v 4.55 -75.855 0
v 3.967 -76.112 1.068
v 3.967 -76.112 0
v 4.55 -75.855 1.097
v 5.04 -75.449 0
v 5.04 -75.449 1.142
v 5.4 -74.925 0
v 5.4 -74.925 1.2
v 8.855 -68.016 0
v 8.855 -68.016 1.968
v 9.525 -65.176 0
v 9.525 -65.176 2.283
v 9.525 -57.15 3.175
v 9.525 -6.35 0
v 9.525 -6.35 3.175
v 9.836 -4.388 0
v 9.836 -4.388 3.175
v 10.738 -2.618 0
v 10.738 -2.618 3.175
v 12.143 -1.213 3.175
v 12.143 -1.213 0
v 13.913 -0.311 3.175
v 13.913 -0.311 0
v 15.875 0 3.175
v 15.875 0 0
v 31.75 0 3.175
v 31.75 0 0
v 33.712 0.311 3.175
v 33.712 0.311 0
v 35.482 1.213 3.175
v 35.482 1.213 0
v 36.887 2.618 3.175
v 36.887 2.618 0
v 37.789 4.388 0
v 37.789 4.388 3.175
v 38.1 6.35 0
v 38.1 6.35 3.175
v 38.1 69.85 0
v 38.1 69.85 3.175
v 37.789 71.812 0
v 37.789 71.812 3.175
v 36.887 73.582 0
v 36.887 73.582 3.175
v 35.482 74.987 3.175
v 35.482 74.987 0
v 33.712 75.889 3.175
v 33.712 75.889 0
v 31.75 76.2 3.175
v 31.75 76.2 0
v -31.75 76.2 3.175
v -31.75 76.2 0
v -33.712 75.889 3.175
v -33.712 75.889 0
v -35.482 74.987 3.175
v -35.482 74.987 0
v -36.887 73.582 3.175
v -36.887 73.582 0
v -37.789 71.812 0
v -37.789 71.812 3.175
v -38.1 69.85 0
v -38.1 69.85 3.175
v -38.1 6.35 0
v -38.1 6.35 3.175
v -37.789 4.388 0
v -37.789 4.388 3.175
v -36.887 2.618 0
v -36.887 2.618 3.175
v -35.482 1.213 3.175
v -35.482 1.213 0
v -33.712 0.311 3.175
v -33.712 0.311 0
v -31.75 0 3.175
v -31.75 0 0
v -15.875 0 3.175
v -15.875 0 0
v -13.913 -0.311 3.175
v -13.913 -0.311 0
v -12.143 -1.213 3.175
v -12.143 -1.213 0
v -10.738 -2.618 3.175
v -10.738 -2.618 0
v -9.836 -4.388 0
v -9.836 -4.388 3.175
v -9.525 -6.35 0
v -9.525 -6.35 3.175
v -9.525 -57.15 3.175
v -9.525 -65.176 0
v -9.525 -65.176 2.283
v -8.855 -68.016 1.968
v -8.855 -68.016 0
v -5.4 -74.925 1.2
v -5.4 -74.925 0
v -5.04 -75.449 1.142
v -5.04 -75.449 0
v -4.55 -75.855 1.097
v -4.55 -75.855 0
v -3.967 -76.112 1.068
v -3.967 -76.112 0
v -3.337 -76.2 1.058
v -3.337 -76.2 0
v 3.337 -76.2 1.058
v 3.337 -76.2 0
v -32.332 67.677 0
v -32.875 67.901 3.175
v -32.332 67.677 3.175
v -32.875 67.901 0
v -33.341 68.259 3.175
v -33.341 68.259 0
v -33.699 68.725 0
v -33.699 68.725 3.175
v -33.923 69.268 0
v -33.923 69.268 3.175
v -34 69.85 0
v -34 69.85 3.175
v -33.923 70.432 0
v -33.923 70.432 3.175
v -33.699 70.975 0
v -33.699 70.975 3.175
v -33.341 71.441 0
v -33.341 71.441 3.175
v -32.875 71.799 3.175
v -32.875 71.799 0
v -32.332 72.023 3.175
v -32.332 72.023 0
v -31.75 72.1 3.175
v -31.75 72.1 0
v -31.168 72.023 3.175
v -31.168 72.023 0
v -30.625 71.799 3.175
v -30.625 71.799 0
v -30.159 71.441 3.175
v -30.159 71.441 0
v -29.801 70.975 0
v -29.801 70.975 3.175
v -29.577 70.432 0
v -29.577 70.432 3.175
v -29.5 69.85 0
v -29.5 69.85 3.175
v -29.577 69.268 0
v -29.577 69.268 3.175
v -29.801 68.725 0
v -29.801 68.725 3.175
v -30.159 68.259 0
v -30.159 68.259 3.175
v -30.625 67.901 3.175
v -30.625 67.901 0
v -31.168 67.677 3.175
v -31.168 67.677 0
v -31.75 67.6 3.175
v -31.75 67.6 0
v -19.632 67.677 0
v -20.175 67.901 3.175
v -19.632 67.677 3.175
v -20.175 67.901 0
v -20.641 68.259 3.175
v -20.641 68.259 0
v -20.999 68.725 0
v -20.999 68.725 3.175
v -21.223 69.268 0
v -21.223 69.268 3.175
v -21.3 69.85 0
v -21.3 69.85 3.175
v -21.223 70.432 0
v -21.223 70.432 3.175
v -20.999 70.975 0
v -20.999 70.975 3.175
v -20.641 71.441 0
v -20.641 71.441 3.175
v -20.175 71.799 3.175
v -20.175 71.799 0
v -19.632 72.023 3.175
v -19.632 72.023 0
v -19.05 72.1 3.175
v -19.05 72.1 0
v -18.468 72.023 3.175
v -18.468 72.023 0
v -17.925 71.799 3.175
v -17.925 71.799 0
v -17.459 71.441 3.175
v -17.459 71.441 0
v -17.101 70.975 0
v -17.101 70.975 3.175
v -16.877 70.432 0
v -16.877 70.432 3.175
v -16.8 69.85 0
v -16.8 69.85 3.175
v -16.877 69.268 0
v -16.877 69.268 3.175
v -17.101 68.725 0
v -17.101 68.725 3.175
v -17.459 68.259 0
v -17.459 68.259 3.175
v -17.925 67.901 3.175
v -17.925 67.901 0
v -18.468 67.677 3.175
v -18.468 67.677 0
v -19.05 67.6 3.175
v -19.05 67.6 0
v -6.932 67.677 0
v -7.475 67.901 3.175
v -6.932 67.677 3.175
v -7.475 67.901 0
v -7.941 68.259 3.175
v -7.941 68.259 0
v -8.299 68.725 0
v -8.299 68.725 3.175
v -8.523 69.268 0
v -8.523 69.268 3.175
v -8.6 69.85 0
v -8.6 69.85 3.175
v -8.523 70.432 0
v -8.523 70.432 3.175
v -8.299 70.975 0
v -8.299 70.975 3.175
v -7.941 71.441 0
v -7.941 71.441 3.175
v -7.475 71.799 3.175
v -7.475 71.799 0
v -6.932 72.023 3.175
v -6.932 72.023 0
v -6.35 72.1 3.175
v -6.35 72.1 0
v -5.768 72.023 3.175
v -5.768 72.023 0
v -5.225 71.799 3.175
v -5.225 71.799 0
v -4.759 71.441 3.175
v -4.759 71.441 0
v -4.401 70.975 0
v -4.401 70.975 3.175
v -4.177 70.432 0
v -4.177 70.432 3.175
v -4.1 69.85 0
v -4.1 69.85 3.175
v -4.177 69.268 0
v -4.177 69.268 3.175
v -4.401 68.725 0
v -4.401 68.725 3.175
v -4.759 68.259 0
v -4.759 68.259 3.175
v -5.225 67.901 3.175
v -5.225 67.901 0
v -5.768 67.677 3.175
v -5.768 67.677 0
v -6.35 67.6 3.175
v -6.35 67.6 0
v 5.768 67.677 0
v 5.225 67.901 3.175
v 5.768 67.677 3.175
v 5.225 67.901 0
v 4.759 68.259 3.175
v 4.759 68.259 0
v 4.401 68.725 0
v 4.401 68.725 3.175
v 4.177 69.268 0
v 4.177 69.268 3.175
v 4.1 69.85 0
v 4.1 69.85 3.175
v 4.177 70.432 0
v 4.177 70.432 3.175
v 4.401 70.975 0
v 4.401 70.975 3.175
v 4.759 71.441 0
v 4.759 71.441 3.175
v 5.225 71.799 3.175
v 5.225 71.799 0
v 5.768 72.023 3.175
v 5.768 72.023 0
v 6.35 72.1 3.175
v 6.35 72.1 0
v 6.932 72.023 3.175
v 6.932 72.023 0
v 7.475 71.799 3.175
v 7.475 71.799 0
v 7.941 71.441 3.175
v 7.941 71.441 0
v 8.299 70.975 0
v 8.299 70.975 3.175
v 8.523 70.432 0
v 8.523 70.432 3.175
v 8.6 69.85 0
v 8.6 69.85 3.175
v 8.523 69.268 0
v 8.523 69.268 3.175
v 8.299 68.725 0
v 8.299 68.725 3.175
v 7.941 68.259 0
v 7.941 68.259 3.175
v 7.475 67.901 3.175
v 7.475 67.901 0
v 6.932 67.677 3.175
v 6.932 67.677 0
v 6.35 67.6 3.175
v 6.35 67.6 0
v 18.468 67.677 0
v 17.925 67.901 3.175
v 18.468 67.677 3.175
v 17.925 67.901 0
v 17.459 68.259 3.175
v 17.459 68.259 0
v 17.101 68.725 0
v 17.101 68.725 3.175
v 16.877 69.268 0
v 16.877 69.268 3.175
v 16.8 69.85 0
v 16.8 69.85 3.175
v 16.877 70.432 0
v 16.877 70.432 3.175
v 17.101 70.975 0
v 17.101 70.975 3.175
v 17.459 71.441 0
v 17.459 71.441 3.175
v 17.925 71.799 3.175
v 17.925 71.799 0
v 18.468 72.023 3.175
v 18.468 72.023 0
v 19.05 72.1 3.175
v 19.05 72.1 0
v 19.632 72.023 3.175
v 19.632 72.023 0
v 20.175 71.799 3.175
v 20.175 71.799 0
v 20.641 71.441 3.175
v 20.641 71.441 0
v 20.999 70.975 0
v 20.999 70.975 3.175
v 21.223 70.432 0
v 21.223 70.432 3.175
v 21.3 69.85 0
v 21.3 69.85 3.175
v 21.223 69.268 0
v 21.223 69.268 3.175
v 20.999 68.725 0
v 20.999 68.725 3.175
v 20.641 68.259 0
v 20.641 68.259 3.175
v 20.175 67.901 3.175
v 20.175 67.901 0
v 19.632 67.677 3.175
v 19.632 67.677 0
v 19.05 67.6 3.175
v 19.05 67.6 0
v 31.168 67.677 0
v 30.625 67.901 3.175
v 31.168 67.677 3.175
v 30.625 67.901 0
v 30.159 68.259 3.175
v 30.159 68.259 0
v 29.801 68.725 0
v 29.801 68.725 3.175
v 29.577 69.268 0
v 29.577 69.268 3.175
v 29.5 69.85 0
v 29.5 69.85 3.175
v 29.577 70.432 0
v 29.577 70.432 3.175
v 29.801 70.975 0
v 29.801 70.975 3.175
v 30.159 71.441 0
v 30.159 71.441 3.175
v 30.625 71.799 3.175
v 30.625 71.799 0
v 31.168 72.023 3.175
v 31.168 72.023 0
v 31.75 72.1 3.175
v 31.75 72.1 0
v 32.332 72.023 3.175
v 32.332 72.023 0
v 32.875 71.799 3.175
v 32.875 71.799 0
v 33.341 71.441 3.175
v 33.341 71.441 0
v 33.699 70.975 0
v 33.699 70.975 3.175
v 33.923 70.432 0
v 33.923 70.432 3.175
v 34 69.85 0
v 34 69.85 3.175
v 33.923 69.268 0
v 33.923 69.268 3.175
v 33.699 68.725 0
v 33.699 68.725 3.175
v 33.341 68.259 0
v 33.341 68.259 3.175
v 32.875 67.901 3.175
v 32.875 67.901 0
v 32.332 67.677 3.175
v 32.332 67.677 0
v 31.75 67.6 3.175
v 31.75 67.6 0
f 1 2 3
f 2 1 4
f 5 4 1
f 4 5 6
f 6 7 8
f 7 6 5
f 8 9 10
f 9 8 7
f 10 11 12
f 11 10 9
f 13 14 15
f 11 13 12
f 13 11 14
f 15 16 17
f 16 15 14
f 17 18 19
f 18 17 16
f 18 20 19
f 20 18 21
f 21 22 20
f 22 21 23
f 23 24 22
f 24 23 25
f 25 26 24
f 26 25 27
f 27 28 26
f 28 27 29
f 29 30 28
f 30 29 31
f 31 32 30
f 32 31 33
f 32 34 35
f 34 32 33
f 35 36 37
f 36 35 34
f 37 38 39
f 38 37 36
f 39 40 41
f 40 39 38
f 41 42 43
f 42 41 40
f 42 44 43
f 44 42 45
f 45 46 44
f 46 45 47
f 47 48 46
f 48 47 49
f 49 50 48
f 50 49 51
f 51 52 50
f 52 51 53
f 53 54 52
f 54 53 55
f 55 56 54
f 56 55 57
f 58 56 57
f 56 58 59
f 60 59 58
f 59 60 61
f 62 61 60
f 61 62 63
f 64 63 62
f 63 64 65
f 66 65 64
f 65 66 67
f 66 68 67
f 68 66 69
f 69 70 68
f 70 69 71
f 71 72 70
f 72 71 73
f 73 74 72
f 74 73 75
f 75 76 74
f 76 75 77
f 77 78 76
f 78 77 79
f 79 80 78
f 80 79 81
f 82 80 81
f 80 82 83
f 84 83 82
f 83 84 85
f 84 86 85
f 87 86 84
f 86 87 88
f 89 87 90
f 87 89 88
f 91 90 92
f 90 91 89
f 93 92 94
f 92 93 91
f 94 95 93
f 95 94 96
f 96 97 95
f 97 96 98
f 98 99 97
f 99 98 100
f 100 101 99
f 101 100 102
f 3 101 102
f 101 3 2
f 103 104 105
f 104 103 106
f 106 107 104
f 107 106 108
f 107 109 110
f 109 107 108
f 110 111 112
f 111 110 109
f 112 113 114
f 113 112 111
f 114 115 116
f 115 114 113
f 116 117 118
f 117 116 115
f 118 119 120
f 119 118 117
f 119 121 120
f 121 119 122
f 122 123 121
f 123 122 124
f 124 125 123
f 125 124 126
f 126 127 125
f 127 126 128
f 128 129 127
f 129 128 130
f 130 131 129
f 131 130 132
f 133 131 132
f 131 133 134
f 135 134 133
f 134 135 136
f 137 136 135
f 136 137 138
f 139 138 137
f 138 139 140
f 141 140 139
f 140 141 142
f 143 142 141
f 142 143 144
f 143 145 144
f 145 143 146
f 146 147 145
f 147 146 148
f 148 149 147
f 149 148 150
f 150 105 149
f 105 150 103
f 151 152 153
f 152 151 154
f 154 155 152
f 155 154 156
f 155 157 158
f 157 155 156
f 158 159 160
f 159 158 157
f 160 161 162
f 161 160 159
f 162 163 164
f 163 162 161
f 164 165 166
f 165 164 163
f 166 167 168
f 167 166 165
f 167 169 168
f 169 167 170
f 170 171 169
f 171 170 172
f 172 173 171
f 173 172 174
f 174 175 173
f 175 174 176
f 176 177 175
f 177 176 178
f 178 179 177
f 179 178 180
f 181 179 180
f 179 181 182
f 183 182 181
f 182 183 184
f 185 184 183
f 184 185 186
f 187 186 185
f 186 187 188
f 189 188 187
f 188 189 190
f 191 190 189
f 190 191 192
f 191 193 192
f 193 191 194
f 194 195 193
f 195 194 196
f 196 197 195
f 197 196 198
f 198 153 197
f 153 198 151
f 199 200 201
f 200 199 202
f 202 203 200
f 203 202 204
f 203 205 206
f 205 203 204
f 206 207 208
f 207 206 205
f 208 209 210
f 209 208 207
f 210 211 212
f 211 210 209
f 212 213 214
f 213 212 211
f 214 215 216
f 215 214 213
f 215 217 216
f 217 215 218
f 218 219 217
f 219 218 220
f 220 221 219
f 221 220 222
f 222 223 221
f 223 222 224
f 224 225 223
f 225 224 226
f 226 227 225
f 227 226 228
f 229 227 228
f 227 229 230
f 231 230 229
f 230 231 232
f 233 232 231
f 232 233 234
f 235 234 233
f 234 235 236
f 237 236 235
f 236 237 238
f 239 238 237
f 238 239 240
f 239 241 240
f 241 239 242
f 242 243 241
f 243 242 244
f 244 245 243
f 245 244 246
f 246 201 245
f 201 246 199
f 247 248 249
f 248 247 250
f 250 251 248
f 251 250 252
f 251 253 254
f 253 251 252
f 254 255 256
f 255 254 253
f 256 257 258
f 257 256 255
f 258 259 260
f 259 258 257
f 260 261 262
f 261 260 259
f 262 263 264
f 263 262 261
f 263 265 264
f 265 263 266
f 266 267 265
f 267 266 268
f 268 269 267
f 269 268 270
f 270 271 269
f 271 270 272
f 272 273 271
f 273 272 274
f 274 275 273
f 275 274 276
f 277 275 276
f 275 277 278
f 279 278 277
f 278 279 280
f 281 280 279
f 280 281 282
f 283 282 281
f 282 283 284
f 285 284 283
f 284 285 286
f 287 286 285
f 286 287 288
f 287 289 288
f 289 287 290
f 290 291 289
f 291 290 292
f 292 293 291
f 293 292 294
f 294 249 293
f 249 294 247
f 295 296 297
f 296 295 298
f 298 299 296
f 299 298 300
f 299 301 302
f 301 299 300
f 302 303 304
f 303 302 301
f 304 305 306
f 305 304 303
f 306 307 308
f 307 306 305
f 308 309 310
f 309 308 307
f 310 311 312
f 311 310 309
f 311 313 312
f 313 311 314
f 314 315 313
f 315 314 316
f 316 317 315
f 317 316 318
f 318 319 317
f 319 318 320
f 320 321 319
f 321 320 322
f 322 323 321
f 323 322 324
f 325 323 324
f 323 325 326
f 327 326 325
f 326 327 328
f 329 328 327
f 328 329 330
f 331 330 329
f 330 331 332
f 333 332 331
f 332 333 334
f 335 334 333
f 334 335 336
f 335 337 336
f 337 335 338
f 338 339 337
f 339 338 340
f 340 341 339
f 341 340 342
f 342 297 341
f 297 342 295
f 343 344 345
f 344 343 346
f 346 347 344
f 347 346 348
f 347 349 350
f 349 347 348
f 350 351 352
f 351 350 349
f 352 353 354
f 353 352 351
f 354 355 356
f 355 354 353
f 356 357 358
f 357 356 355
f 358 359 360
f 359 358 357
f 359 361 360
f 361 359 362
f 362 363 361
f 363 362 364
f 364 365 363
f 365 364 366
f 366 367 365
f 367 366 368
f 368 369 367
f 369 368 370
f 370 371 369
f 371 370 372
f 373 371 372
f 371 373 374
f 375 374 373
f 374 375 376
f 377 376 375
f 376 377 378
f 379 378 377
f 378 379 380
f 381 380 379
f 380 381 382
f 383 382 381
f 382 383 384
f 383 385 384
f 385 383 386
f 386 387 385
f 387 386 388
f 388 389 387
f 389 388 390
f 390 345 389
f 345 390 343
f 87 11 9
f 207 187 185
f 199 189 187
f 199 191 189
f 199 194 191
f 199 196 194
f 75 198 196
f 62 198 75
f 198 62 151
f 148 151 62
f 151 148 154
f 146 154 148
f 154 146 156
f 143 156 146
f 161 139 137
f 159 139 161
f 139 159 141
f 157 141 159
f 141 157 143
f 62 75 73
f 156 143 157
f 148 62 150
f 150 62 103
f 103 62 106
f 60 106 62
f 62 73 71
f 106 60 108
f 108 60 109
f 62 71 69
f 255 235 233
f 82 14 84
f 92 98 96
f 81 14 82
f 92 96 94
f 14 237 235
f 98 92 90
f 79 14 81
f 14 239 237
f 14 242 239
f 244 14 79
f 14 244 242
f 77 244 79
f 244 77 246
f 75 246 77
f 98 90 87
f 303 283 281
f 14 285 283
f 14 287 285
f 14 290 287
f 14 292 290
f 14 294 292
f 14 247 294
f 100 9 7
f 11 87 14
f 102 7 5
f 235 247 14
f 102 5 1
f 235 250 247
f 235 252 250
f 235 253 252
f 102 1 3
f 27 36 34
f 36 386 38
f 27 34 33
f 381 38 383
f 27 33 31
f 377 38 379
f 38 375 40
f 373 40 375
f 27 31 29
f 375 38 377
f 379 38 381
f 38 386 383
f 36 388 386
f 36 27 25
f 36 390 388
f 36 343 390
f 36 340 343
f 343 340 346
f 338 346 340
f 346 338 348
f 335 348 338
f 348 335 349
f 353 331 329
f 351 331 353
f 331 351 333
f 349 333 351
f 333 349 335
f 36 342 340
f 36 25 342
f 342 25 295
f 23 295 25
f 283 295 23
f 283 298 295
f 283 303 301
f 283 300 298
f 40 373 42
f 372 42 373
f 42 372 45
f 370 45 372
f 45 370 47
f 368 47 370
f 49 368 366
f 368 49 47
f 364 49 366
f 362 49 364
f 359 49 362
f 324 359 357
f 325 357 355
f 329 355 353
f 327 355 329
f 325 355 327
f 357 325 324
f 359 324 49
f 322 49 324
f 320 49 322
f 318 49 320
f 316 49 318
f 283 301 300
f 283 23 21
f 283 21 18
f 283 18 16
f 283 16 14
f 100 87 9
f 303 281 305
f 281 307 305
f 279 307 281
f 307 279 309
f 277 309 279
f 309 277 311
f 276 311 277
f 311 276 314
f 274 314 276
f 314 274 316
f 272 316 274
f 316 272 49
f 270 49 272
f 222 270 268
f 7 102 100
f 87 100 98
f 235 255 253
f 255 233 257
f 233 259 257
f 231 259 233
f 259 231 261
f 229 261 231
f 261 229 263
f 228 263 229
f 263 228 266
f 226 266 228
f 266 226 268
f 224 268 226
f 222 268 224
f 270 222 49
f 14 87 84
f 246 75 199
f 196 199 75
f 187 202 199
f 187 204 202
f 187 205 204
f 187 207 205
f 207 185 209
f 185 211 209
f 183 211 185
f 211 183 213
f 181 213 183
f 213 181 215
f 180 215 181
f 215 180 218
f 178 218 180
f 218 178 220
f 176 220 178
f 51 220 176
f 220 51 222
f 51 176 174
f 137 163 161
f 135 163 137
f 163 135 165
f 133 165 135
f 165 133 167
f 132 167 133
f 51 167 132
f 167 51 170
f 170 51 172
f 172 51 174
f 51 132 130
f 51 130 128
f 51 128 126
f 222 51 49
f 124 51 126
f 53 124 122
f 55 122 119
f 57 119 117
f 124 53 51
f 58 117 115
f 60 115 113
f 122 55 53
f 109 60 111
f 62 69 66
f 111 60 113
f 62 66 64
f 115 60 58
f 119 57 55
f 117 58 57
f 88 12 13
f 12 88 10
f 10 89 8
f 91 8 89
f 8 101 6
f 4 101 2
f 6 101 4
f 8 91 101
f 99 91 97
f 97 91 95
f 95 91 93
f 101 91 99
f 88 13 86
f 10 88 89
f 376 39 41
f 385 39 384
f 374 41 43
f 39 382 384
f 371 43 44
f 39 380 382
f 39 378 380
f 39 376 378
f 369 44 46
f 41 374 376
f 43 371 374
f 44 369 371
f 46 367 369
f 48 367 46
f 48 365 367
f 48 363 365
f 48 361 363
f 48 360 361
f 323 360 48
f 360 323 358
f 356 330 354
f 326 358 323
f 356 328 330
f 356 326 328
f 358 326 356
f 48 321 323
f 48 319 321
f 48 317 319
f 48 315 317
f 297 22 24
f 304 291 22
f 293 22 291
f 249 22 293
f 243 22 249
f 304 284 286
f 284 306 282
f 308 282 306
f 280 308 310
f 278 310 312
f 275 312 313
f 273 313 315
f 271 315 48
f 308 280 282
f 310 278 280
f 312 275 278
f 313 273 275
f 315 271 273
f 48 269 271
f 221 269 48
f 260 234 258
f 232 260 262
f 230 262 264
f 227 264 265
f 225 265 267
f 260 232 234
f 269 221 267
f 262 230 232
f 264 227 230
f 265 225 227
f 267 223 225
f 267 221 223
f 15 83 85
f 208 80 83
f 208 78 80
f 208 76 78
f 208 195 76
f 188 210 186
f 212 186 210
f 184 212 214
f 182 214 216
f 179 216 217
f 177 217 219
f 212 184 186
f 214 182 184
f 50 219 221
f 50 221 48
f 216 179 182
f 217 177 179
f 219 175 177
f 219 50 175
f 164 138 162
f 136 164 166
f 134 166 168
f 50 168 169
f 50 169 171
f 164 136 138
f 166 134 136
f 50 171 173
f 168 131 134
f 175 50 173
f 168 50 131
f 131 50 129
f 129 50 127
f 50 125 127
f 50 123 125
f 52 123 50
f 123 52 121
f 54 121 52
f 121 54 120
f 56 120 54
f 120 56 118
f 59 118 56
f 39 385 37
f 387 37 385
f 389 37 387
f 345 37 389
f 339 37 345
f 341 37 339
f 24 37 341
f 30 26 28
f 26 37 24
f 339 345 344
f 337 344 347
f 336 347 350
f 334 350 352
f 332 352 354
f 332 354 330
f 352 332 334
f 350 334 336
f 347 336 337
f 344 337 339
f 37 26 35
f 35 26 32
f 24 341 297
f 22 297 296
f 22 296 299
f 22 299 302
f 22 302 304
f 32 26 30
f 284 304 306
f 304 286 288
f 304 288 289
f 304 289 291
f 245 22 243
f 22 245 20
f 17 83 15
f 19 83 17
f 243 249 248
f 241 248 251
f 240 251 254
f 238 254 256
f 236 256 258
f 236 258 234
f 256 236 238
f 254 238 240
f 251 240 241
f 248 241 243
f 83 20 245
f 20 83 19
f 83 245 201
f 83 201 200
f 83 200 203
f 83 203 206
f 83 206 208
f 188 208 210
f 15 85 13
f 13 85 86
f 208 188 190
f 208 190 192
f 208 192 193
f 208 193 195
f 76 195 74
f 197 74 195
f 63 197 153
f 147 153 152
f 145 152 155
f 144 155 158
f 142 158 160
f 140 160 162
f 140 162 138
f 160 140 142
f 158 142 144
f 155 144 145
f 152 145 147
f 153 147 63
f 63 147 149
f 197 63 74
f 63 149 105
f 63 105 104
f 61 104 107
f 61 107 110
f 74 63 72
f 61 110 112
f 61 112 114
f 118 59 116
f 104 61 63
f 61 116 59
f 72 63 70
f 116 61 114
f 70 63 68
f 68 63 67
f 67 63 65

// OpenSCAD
// file: ../lib/TOGUnitTable-v1.scad
// TOGUnitTable-v1.1.0 - Library for handling 'complex amounts' in the form of [multiplier, unit name], e.g. [1.5, "inch"]
//
// 2023-07-01: the following 'annotation' is something I just made up,
// but is intended as a way for future packaging tools to know that it's 'safe'
// (because everything has been somewhat namespaced) to turn a `use <x>`
// into an `include <x>`, making it inlinable:
// safe-to-include: true
// 
// Versions:
// v1.0.0:
// - Created it.
// v1.1.0:
// - Add optional 'dbgctxstr' parameter to unit decoding functions, for better error messages
// 
// Naming convention:
// Doing 'OO without classes', here.
// Fully qualified name = class or package name + "__" + member name
// Class or package name may itself be namespaced, and class names may double as package names.
// Here, tog_unittable names both a class and a package.

// Demo unit table uses 'micrometer' as the base unit
// in order to keep multipliers as integers as much as possible.
tog_unittable__demo_unit_table = [
	["um",    [    1   ,   "um"], "micrometer" ],
	["mm",    [ 1000   ,   "um"], "millimeter" ],
	["inch",  [25400   ,   "um"], "inch"       ],
	["u",     [    1/16, "inch"], "model unit" ], // As used by TGx9 et al
	["atom",  [    8   ,    "u"], "model atom" ],
	["chunk", [    3   , "atom"], "model chunk"],
];

use <./DbgCtxStrLib1.scad>

function tog_unittable__list__filter(list, predicate) = [
	for( item=list ) if( predicate(item) ) item
];
function tog_unittable__list__first(list, on_error) =
	len(list) > 0 ? list[0] : on_error();

function tog_unittable__unit_value_ca(unit_table, unit_name, dbgctxstr=undef) =
	tog_unittable__list__first(
		tog_unittable__list__filter(unit_table, function (entry) entry[0] == unit_name),
		function () assert(false,
			str("Did not find entry for unit '", unit_name, "' in unit table", dbgctxstr_errmsg_suffix(dbgctxstr))
		)
	)[1];

function tog_unittable__ca__is_valid( ca ) =
	is_list(ca) && len(ca) == 2;

// Break down 'amount' until it is in a base unit (one which is defined in terms of itself)
function tog_unittable__simplify_ca(unit_table, amount, dbgctxstr=undef) =
	assert( tog_unittable__ca__is_valid(amount), str(amount, " is not a valid Complex Amount (should be [numeric_value, \"unit_name\"])", dbgctxstr=dbgctxstr) )
	let( unit_value_ca = tog_unittable__unit_value_ca(unit_table, amount[1], dbgctxstr=dbgctxstr) )
	unit_value_ca[1] == amount[1] ? amount :
		tog_unittable__simplify_ca(unit_table, [amount[0] * unit_value_ca[0], unit_value_ca[1]]);

function tog_unittable__divide_ca(unit_table, numerator, denominator, dbgctxstr=undef) =
	let(
		numerator_base_ca   = tog_unittable__simplify_ca(unit_table, numerator, dbgctxstr=dbgctxstr),
		denominator_base_ca = tog_unittable__simplify_ca(unit_table, denominator, dbgctxstr=dbgctxstr)
	)
	assert(numerator_base_ca[1] == denominator_base_ca[1], str("Different base units found for ", numerator[1], " and ", denominator[1]))
	numerator_base_ca[0] / denominator_base_ca[0];	

assert(tog_unittable__divide_ca(tog_unittable__demo_unit_table, [1,   "mm"], [  1, "mm"]) ==     1   );
assert(tog_unittable__divide_ca(tog_unittable__demo_unit_table, [1,   "mm"], [  1, "um"]) ==  1000   );
assert(tog_unittable__divide_ca(tog_unittable__demo_unit_table, [1, "inch"], [  1, "um"]) == 25400   );
assert(tog_unittable__divide_ca(tog_unittable__demo_unit_table, [1, "inch"], [  1, "mm"]) ==    25.4 );
assert(tog_unittable__divide_ca(tog_unittable__demo_unit_table, [1, "inch"], [254, "um"]) ==   100   );
assert(tog_unittable__divide_ca(tog_unittable__demo_unit_table, [1,    "u"], [  1, "um"]) ==  1587.5 );
// file: ../lib/TOGStringLib1.scad
// TOGStringLib1.7
// 
// Functions for parsing quantities
// and other misc. string handling.
// 
// v1.5
// - togstr1_parse_quantity will treat unit-only strings as meaning 1/1 of that unit.
//   e.g. togstr1_parse_quantity("foot") = [[[1,1], "foot", 4]]
// v1.6:
// - togstr1_parse_quantity allows unit name to be omitted when quantity is zero and $togunits1_default_unit is defined
// v1.7:
// - Add optional 'dbgctxstr' parameter to unit decoding functions, for better error messages
// 
// Globals: $togunits1_default_unit - affects what 'unit' is returned
// when interpreting numbers or strings that lack the unit.


function togstr1__todo(message) = assert(false, str("TODO: ", message));

module togstr1__assert_eq(a, b) {
	if( a != b ) {
		assert( a == b, str(a, " != ", b) );
	}
}



function togstr1_slice(source, i0, i1) =
	i0 == i1 ? "" :
	str(source[i0], togstr1_slice(source, i0+1, i1));

function togstr1_tokenize(source, sep, maxcount=9999, i=0, tokenstart=0) =
	len(source) == i ? (
		(tokenstart < i) ? [togstr1_slice(source, tokenstart, i)] : []
	) :
	source[i] == sep ? (
		(tokenstart < i) ? concat([togstr1_slice(source, tokenstart, i)], togstr1_tokenize(source, sep, maxcount-1, i+1, i+1)) :
		togstr1_tokenize(source, sep, maxcount, i+1, i+1)
	) :
	maxcount <= 1 ? [togstr1_slice(source, tokenstart, len(source))] :
	togstr1_tokenize(source, sep, maxcount, i+1, tokenstart);

togstr1__assert_eq( ["foo","bar","baz"], togstr1_tokenize("foo-bar-baz", "-") );
// Duplicate delimiters are ignored
togstr1__assert_eq( ["foo","bar","baz"], togstr1_tokenize("foo--bar--baz", "-") );
// Trailing delimiters are ignored
togstr1__assert_eq( ["foo","bar","baz"], togstr1_tokenize("foo--bar--baz--", "-") );
// Leading delimiters are ignored
togstr1__assert_eq( ["foo","bar","baz"], togstr1_tokenize("--foo--bar--baz", "-") );
// Can limit number of tokens returned
togstr1__assert_eq( ["foo","bar-baz"], togstr1_tokenize("foo-bar-baz", "-", 2) );
togstr1__assert_eq( ["foo","bar-baz"], togstr1_tokenize("--foo--bar-baz", "-", 2) );
togstr1__assert_eq( ["foo","bar--baz"], togstr1_tokenize("--foo--bar--baz", "-", 2) );
togstr1__assert_eq( ["foo"], togstr1_tokenize("--foo--", "-", 2) );




/** \d+ -> [num, end_index] */
function togstr1_parse_decimal_nat(str, index=0, current=0, dbgctxstr=undef) =
	len(str) == index ? [current, index] :
	let( dig = ord(str[index]) - ord("0") )
	(dig >= 0 && dig <= 9) ? togstr1_parse_decimal_nat(str, index+1, current*10 + dig, dbgctxstr=dbgctxstr) :
	[current, index];

togstr1__assert_eq( [123,3], togstr1_parse_decimal_nat("123") );
togstr1__assert_eq( [123,3], togstr1_parse_decimal_nat("123.45") );

/** [+-]*\d+ ->  [[num, den], end_index] */
function togstr1_parse_decimal_number(str, index=0, dbgctxstr=undef) =
	str[index] == "+" ? togstr1_parse_decimal_number(str, index+1) :
	str[index] == "-" ? let(r=togstr1_parse_decimal_number(str, index+1)) [[-r[0][0], r[0][1]], r[1]] :
	let(r = togstr1_parse_decimal_nat(str, index, dbgctxstr=dbgctxstr))
	str[r[1]] != "." ? [[r[0], 1], r[1]] :
	let(fracr = togstr1_parse_decimal_nat(str, r[1]+1))
	let(mult = pow(10, fracr[1]-(r[1]+1)))
	[[r[0]*mult + fracr[0], mult], fracr[1]];

togstr1__assert_eq( [[   36,   1], 2], togstr1_parse_decimal_number( "36"   ) );
togstr1__assert_eq( [[ 3524, 100], 5], togstr1_parse_decimal_number( "35.24") );
togstr1__assert_eq( [[-3524, 100], 6], togstr1_parse_decimal_number("-35.24") );
togstr1__assert_eq( [[    0,   1], 0], togstr1_parse_decimal_number( "NotANumber") );

function togstr1__gcd(a, b) = b == 0 ? abs(a) : togstr1__gcd(b, a % b);

togstr1__assert_eq(10, togstr1__gcd(10, 20));
togstr1__assert_eq( 5, togstr1__gcd(10, 15));
togstr1__assert_eq( 2, togstr1__gcd(10, 14));


function togstr1__normalize_rat(rat) =
	let(gcd = togstr1__gcd(rat[0], rat[1]))
	// TODO: find LCD, divide top and bottom by it
	rat[0] < 0 && rat[1] < 0 ? [-rat[0]/gcd, -rat[1]/gcd] :
	[rat[0]/gcd, rat[1]/gcd];

/** <decnum>[/<decnum>] -> [[num, den], end_index] */
function togstr1__multiply_rat(a, b) =
	togstr1__normalize_rat(
		a[1] == b[1] ? [a[0]*b[0]/a[1], a[1]] : // TODO: LCD instead of special case
		[a[0]*b[0], a[1]*b[1]]
	);
function togstr1__divide_rat(a, b) = togstr1__normalize_rat([a[0]*b[1], a[1]*b[0]]);


function togstr1__add_rat(a, b) =
	togstr1__normalize_rat([a[0]*b[1] + b[0]*a[1], a[1]*b[1]]);
	
togstr1__assert_eq([1, 2], togstr1__add_rat([1, 3], [1, 6]));


/** Return [[num, den], end_index] */
function togstr1_parse_rational_number(str, index=0, dbgctxstr=undef) =
	let( numr = togstr1_parse_decimal_number(str, index, dbgctxstr=dbgctxstr) )
	str[numr[1]] == "+" ?
		let(numrb = togstr1_parse_rational_number(str, numr[1]+1, dbgctxstr=dbgctxstr))
		[togstr1__add_rat(numr[0], numrb[0]), numrb[1]]	:
	str[numr[1]] == "/" ?
		let( denr = togstr1_parse_decimal_number(str, numr[1]+1, dbgctxstr=dbgctxstr) )
		[togstr1__divide_rat(numr[0], denr[0]), denr[1]] :
	numr;

togstr1__assert_eq( [[   123,  1],3], togstr1_parse_rational_number( "123") );
togstr1__assert_eq( [[   123,  1],4], togstr1_parse_rational_number("+123") );
togstr1__assert_eq( [[-  123,  1],4], togstr1_parse_rational_number("-123") );
togstr1__assert_eq( [[   123,  1],6], togstr1_parse_rational_number("-+-123") );
togstr1__assert_eq( [[ 12345,100],6], togstr1_parse_rational_number("123.45") );
togstr1__assert_eq( [[  2469, 40],8], togstr1_parse_rational_number("123.45/2") );
togstr1__assert_eq( [[-  823,160],10], togstr1_parse_rational_number("-123.45/24") );
togstr1__assert_eq( [[     4,  3],5], togstr1_parse_rational_number( "1+1/3") );
togstr1__assert_eq( [[     0,  1],0], togstr1_parse_rational_number( "NotANumber!!") );


/** Return [[[num, den], unit], end_index] */
function togstr1_parse_quantity(str, dbgctxstr=undef) =
	let( numr = togstr1_parse_rational_number(str, dbgctxstr=dbgctxstr) )
	// For now, just let the unit be the rest of the string;
	// can revisit to stop at delimiters if needed in the future.
	numr[1] > 0 && numr[1] == len(str) && numr[0][0] == 0 && !is_undef($togunits1_default_unit) ? [[[0,1], $togunits1_default_unit], numr[1]] :
	assert( numr[1] < len(str), str("Quantity string missing unit: '", str, "'; note that '0' is acceptable if $togunits1_default_unit is defined"))
	let( unit = togstr1_slice(str, numr[1], len(str)) )
	let( quant = numr[1] > 0 ? numr[0] : [1,1] ) // No number = 1 (possibly this should be an error instead)
	[[quant, unit], len(str)];

togstr1__assert_eq( [[[  3,  1], "acre"],  5], togstr1_parse_quantity("3acre") );
togstr1__assert_eq( [[[  3,  5], "acre"],  7], togstr1_parse_quantity("3/5acre") );
togstr1__assert_eq( [[[301,500], "acre"], 10], togstr1_parse_quantity("3.01/5acre") );
togstr1__assert_eq( [[[  1,  1], "acre"],  4], togstr1_parse_quantity("acre") ); // Should either treat as one or throw an error!
togstr1__assert_eq( [[[  0,  1],"hectare"],1], togstr1_parse_quantity("0", $togunits1_default_unit="hectare") ); // Zero is fine if $togunits1_default_unit is defined
// file: ../lib/TOGridLib3.scad
// TOGridPileLib-v3.4
// 
// HOKAY WHAT ARE THE COMMON
// things that I want the library to do?
// 
// - [X] Be `include`-able, to make inlining easy
// - [X] Allow unit table to be overridden easily, but default by default
// - [ ] Support common configurations by name (e.g. "V9", or some "WSTYPE-...")
//   without having to pass 50 different parameters in
// - [ ] Support subtractions for those common configurations also,
//   such that you don't need to remember to 'do less rounding', etc.
// - [ ] Make a simple foot-only block that I can subtract stuff from
//   params: foot style
// - [ ] Make a block with a lip
// - [ ] Make a block foot, and I'll intersect it with some other things
// - [X] Translate a block_size_ca to mm
// 
// Changes:
// v3.1:
// - s/togridpile3_decode_size/togridpile3_decode_vector/
// v3.2:
// - togridpile3_decode(num) = num
// v3.3:
// - Change prefix from `togridpile3` to `togridlib3`
// v3.4:
// - Add optional 'dbgctxstr' parameter to unit decoding functions, for better error messages

use <../lib/TOGUnitTable-v1.scad>

function togridlib3_map(arr, fn) = [ for(item=arr) fn(item) ];

togridlib3_default_unit_table = [
	["um",    [    1,               "um"]],
	["mm",    [ 1000,               "um"]],
	["inch",  [25400,               "um"]],
	["u",     [    1.5875,          "mm"]],
	["atom",  [    8,                "u"]],
	["chunk", [    3,             "atom"]],
	["tgp-standard-bevel"   , [2,    "u"]], // Usuually 1/8"
	["m-outer-corner-radius", [4,    "u"]],
	["f-outer-corner-radius", [3,    "u"]],
];

function togridlib3_get_default_unit_table() = togridlib3_default_unit_table;
function togridlib3_get_unit_table() = is_undef($togridlib3_unit_table) ? togridlib3_default_unit_table : $togridlib3_unit_table;

function togridlib3_decode(dim, unit=[1, "mm"], unit_table=togridlib3_get_unit_table(), dbgctxstr=undef) =
	is_num(dim) ? dim : tog_unittable__divide_ca(unit_table, dim, unit, dbgctxstr=dbgctxstr);
function togridlib3_decode_vector(size, unit=[1, "mm"], unit_table=togridlib3_get_unit_table(), dbgctxstr=undef) =
	togridlib3_map(size, function(dim) is_num(dim) ? dim : tog_unittable__divide_ca(unit_table, dim, unit, dbgctxstr=dbgctxstr));

module togridlib3_cube(size, offset=0) {
	cube(togridlib3_decode_vector(size), center=true);
}
// file: ../lib/DbgCtxStrLib1.scad
// DbgCtxStrLib1.0
// 
// Library for dealing with 'debug context strings' (usually 'dbgctxstr').

function dbgctxstr_errmsg_suffix(dbgctxstr) =
	is_undef(dbgctxstr) || dbgctxstr == "" ? "" :
	str(" (", dbgctxstr, ")");
// file: ../lib/TOGComplexLib1.scad
function tcplx1_multiply(a, b) =
	[a[0]*b[0] - a[1]*b[1], a[0]*b[1] + a[1]*b[0]];
function tcplx1_divide(a, b) =
	let(bot = (b[0]*b[0] + b[1]*b[1]))
	[
		(a[0]*b[0] + a[1]*b[1])/bot,
		(a[1]*b[0] - a[0]*b[1])/bot
	];

assert([-11,23] == tcplx1_multiply([3,2], [1,7]));

assert([-1,3] == tcplx1_multiply([3,1], [0,1]));
assert([-1,3] == tcplx1_multiply([0,1], [3,1]));

echo(tcplx1_divide([-1,3], [3,1]));
assert([0,1] == tcplx1_divide([-1,3], [3,1]));

function tcplx1_normalize(vec) =
	let(veclen = sqrt(vec[0]*vec[0]+vec[1]*vec[1]))
	[vec[0] / veclen, vec[1] / veclen];

function tcplx1_relative_turnvec_vv(v0, v1) =
	tcplx1_divide(tcplx1_normalize(v1), tcplx1_normalize(v0));

function tcplx1_relative_turnvec_abc(p0, p1, p2) = tcplx1_relative_turnvec_vv(p1-p0, p2-p1);

// A 90-degree turn
assert([0,1] == tcplx1_relative_turnvec_abc([0,0], [1,0], [1,1]));
assert([0,1] == tcplx1_relative_turnvec_abc([0,0], [0,1], [-1,1]));

// A 45-degree turn
assert(tcplx1_normalize([1,1]) == tcplx1_relative_turnvec_abc([0,0], [1,0], [ 2,1]));
assert(tcplx1_normalize([1,1]) == tcplx1_relative_turnvec_abc([0,0], [0,1], [-1,2]));


function tcplx1_relative_angle_abc(p0, p1, p2) =
	let(turnvec = tcplx1_relative_turnvec_abc(p0, p1, p2))
	atan2(turnvec[1], turnvec[0]);

assert(-135 == tcplx1_relative_angle_abc([0,0], [1,0], [0,-1]));
assert( -90 == tcplx1_relative_angle_abc([0,0], [1,0], [1,-1]));
assert(   0 == tcplx1_relative_angle_abc([0,0], [1,0], [2, 0]));
assert(  90 == tcplx1_relative_angle_abc([0,0], [1,0], [1, 1]));
assert( 135 == tcplx1_relative_angle_abc([0,0], [1,0], [0, 1]));

assert(  90 == tcplx1_relative_angle_abc([1,1], [3,3], [1, 5]));
// file: ../lib/TOGArrayLib1.scad
// TOGArrayLib1.5
// 
// Functions for working with arrays.
// 
// v1.1:
// - tal1_reduce assert(is_list(items)) to prevent infinite recursion
//   when given undefined or other non-list values
// v1.1.1:
// - Fix tal1_uniq_remap_v2 to return "list-remap-result" as the
//   first element of the returned list
// v1.2:
// - Add tal1_replace_at function
// v1.3:
// - tal1_is_vec_of, tal1_is_vec_of_num
// v1.4:
// - tal1_assert_for_each, for when you want to assert something
//   about each of a list of items and get nice failure messages
// v1.5:
// - Add tal1_duplicate_reversed function, which may be
//   handy when generating symmetrical polygons and stuff.

/**
 * Make a list with the contents of list `a`,
 * but starting at offset `off`, replaced by the contents of list `b`.
 * len(result) = max(len(a), off+len(b))
 */
function tal1_replace_at(a, off, b, default_value=undef, default_value_function=undef) =
	assert(is_list(a))
	assert(is_list(b))
	let( _dvf = !is_undef(default_value_function) ? default_value_function : function(i) default_value )
[
	for( i=[0:1:min(off,len(a))-1] ) a[i],
	for( i=[len(a):1:off-1] ) _dvf(i),
	for( i=[off:1:off+len(b)-1] ) b[i-off],
	for( i=[off+len(b):1:len(a)-1] ) a[i],
];

// Simplest case
assert([] == tal1_replace_at([], 0, []));
// Second simplest cases
assert(["foo"] == tal1_replace_at(["foo"], 0, []));
assert(["foo"] == tal1_replace_at([], 0, ["foo"]));
// Replace one item
assert(["foo","quux","baz"] == tal1_replace_at(["foo","bar","baz"], 1, ["quux"]));
// Replace and extend
assert(["foo","quux","tuna","tina"] == tal1_replace_at(["foo","bar","baz"], 1, ["quux", "tuna", "tina"]));
// Add beyond end of `a`
assert(["foo","zzz","quux"] == tal1_replace_at(["foo"], 2, ["quux"], default_value="zzz"));
// Adding 'nothing' should still fill to that point with defaults
assert(["foo","zzz","zzz"] == tal1_replace_at(["foo"], 3, [], default_value="zzz"));


function tal1_reduce(start, items, func, offset=0) =
	assert(is_list(items))
	len(items) == offset ? start :
	tal1_reduce(func(start, items[offset]), items, func, offset+1);

function tal1_consecutive_duplicate_count(items) = tal1_reduce(
	[0, undef],
	items,
	function(z,item) [z[0] + (item == z[1] ? 1 : 0), item]
)[0];

assert(0 == tal1_consecutive_duplicate_count([]));
assert(0 == tal1_consecutive_duplicate_count([50]));
assert(1 == tal1_consecutive_duplicate_count([50,50]));
assert(0 == tal1_consecutive_duplicate_count([50,51,52,53]));
assert(1 == tal1_consecutive_duplicate_count([50,51,52,52]));
assert(3 == tal1_consecutive_duplicate_count([50,50,50,50]));

// Set test_size to arbirarily large values
// to ensure that OpenSCAD can handle heavy recursion
let(test_size=1000) assert(test_size/2 == tal1_consecutive_duplicate_count([for(i=[0:1:test_size-1]) floor(i/2)]));



function tal1_uniq_(items, off0, off1) =
	let(chunklen = off1-off0)
	chunklen == 0 ? [] :
	chunklen == 1 ? [items[off0]] :
	let(half=floor(chunklen/2))
	let(left  = tal1_uniq_(items, off0     , off0+half))
	let(right = tal1_uniq_(items, off0+half, off1     ))
	assert(len(left) > 0)
	assert(len(right) > 0)
	left[len(left)-1] == right[0] ? [each left, for(i=[1:1:len(right)-1]) right[i]] :
	[each left, each right];

/** Given a list of items, returns a new list with identical consecutive items merged */
function tal1_uniq(items) = tal1_uniq_(items, 0, len(items));

assert([] == tal1_uniq([]));
assert([123] == tal1_uniq([123]));
assert([55,0,1,2,3] == tal1_uniq([55,0,1,2,3]));
assert([55,0,1,2] == tal1_uniq([55,0,1,1,2]));
assert([55,0,1] == tal1_uniq([55,55,0,0,0,0,0,0,1,1,1,1]));
assert([55,0] == tal1_uniq([55,0,0,0,0,0,0,0]));



/**
 * Returns [new items, old index -> new index mapping].
 * No-op version.
 */
function tal1_uniq_remap_v1(items) =
	["list-remap-result", items, [for (vi=[0:1:len(items)-1]) vi]];

// [a, a, b, b, c, c]
//
// [a,    ...], []  -> [a],[0]
// [a, a, ...], [0] -> [a],[0,0]

assert([1,2,3] == [1,2,3]);

/**
 * Recursive version that will combine adjacent identical vertexes,
 * but will use the original items.
 */
function tal1_uniq_remap_v2(items, map=[]) =
	let(index = len(map))
	len(items) == index ? ["list-remap-result", items, map] :
	index == 0 ? tal1_uniq_remap_v2(items, [0]) :
	items[index] == items[map[index-1]] ? tal1_uniq_remap_v2(items, [for(vi=map) vi, map[index-1]]) :
	tal1_uniq_remap_v2(items, [for(vi=map) vi, index]);

assert(tal1_uniq_remap_v2([1,1,2,2,3,4]) == ["list-remap-result", [1,1,2,2,3,4], [0,0,2,2,4,5]]);


/**
 * Returns true if `vec` is a list of at least min_len items
 * and component_check(each item, even those beyond min_len) is true.
 */
function tal1_is_vec_of(vec, min_len=0, component_check=function(x) true) =
	assert(is_num(min_len) && min_len >= 0)
	assert(is_function(component_check))
	is_list(vec) && len(vec) >= min_len &&
	tal1_reduce(true, vec, function(prev,item) prev && component_check(item));

function tal1_is_vec_of_num(vec, min_len=0) = tal1_is_vec_of(vec, min_len, function(i) is_num(i));

assert( true == tal1_is_vec_of_num([1,2,3]));
assert( true == tal1_is_vec_of_num([]));
assert( true == tal1_is_vec_of_num([1,2,3], 3));
assert(false == tal1_is_vec_of_num([1,2], 3));
assert(false == tal1_is_vec_of_num([1,2,"spoon"], 3));
// Requirements are ambiguous when
// first min_len items are numbers, but there are non-numeric items afterwards,
// so let's error on the side of saying 'no, it's not a list of numbers';
// i.e. the item check and the min_len are independent.
assert(false == tal1_is_vec_of_num([1,2,3,"artichoke"], 3));


/**
 * Asserts that item_checker(each item in list, index of item)[0] is true.
 * Second element of item_checker return value is assertion message.
 * Returns the original list, in case that's useful to you.
 */
function tal1_assert_for_each(list, item_checker) =
	let( _ignored = [ for(i=[0:1:len(list)-1])
		let(q=item_checker(list[i],i))
		let(passed=is_bool(q) ? q : is_list(q) ? q[0] : assert(false, str(
			"tal1_assert_for_each: item_checker should return Bool|[Bool,String], but returned ",
			q, " for item at index ", i)))
		let(message=is_list(q) ? q[1] : undef)
		assert(passed, message)
		q
	])
	list;

// Callback can return a boolean...
assert([1,2,3] == tal1_assert_for_each([1,2,3], function(v,i) is_num(v)));
// ...or a [boolean, string]
assert([1,2,3] == tal1_assert_for_each([1,2,3], function(v,i) [is_num(v), "element be a num"]));

// [a, b, c] -> [a, b, c, rxf(c), rxf(b), rxf(a)]
function tal1_duplicate_reversed(list, rxf=function(item) item) =
	[
		each list,
		for( i=[len(list)-1 : -1 : 0] ) rxf(list[i]),
	];
// file: ../lib/TOGUnits1.scad
// TOGUnits1.7
// 
// For simlifying quantity parsing and unit conversion
// 
// v1.1:
// - Add `togunits1_decode` function
// v1.2:
// - Add togunits1_decode_vec
// v1.3:
// - Add togunits1_vec_to_cas
// v1.4:
// - Add togunits1_vec_to_mms
// v1.5:
// - Remove unused `unit` parameter from `togunits1_vec_to_cas`
// v1.6:
// - togunits1_decode accepts `xf` parameter, same as togunits1_decode_vec
// v1.7:
// - Add optional 'dbgctxstr' parameter to unit decoding functions, for better error messages
// 
// Reserved but not-yet-actually-used globals:
// - $togunits1_default_unit - default unit when interpreting "0"
//   - See TOGStringLib1
// - $togunits1_default_implied_unit - when interpreting quantities without unit, assume they have this one
//   - This might be a bad idea, so never implemented!

use <./DbgCtxStrLib1.scad>
use <./TOGridLib3.scad>
use <./TOGStringLib1.scad>

function togunits1__is_ca(what) =
	is_list(what) && len(what) == 2 && is_num(what[0]) && is_string(what[1]);

function togunits1__parse_to_ca(what, dbgctxstr=undef) =
	assert( is_string(what) )
	let( parseresult = togstr1_parse_quantity(what, dbgctxstr) )
	assert( parseresult[1] > 0, str("Failed to parse quantity from  ", what, dbgctxstr=dbgctxstr) )
	let( parsed = parseresult[0] )
	let( rat = parsed[0] )
	let( unit = parsed[1] )
	[rat[0]/rat[1], unit];

function togunits1_to_ca(what, dbgctxstr=undef) =
	is_string(what) ? togunits1__parse_to_ca(what, dbgctxstr=dbgctxstr) :
	togunits1__is_ca(what) ? what :
	is_num(what) ? [what, "mm"] :
	assert(false, str("Unrecognized quantity representation: ", what));

function togunits1_vec_to_cas(whats) =
	[for(w=whats) togunits1_to_ca(w)];

function togunits1__get_transform(name) =
	is_function(name) ? name :
	is_undef(name) ? function(n) n :
	name == "round" ? function(n) round(n) :
	name == "ceil" ? function(n) ceil(n) :
	assert(false, str("Unrecognized transform: '", name, "'"));

function togunits1_decode(what, unit=[1,"mm"], xf=undef, dbgctxstr=undef) =
	let( ca = togunits1_to_ca(what, dbgctxstr=dbgctxstr) )
	let( xf1 = togunits1__get_transform(xf) )
	xf1(togridlib3_decode(ca, unit=togunits1_to_ca(unit), dbgctxstr=dbgctxstr));

function togunits1_decode_vec(whats, unit=[1,"mm"], xf=undef) =
	let( unit_ca = togunits1_to_ca(unit) )
	let( xf1 = togunits1__get_transform(xf) )
	[for(w=whats) xf1(togunits1_decode(w, unit_ca))];

function togunits1_to_mm(what, dbgctxstr=undef) = togunits1_decode(what, [1,"mm"], dbgctxstr=dbgctxstr);
function togunits1_vec_to_mms(what) = togunits1_decode_vec(what, [1,"mm"]);
// file: ../lib/TOGMod1Constructors.scad
// TOGMod1Constructors-v1.11
// 
// Functions to construct objects understood by TOGMod1
// 
// v1.1:
// - Add togmod1_make_rounded_rect
// v1.2:
// - togmod1_make_rounded_rect can make ovals
// v1.3:
// - togmod1_circle_points, to just get the points of a circle
// - if pos parameter to circle function has a third element,
//   returned vertexes will include it as the z component;
// v1.3.1
// - Some assertions
// v1.4:
// - Refactor togmod1_rounded_rect_points and togmod1_circle_points
//   to use togmod1__make_nd_vector_adder for adapting to whatever
//   `pos` parameter is.
// v1.5:
// - togmod_rounded_rect_points will not simplify completely rounded sides
//   (where length of side is exactly twice the rounding radius)
//   unless simplify_rounded_sides=true
//   - This makes it more useful for polyhedron generation,
//     where radius varies, but number of points must remain constant.
// v1.6:
// - togmod1_make_rect makes a simple rectangle
// - togmod1_make_rounded_rect will defer to togmod1_make_rect when r=0
// v1.7:
// - togmod1_make_circle will return empty shape (["union"]) when d=0
// v1.8:
// - Add togmod1_text
// v1.9:
// - togmod1_circle_points uses 3 as minimum circle point count instead of 6
// v1.10:
// - Fix togmod1_linear_extrude_y so that range corresponds to Y start/end and
//   polygon X,Y correspond to X,Z.  Previously it was rotated wrongly,
//   which would have gone unnoticed for symmetrical shapes centered at 0,0.
// v1.11:
// - Remove an 'echo'

use <./TOGArrayLib1.scad>

function togmod1__make_nd_vector_adder(origin=[0,0]) =
	let(origin_is_zero = tal1_reduce(true, origin, function(prev,item) prev && item == 0))
	origin_is_zero ? (function(vec) len(vec) >= len(origin) ? vec : tal1_replace_at(origin, 0, vec)) :
	function(vec) [
		for(i=[0:1:max(len(origin),len(vec))-1]) (len(vec) > i ? vec[i] : 0) + (len(origin) > i ? origin[i] : 0),
	];

assert([1,2,3] == togmod1__make_nd_vector_adder()([1,2,3]));
assert([1,2,3] == togmod1__make_nd_vector_adder([0,0,3])([1,2]));


function togmod1_make_cuboid(size) =
	assert(is_list(size))
	assert(len(size) >= 3)
	assert(is_num(size[0]))
	assert(is_num(size[1]))
	assert(is_num(size[2]))
	["polyhedron-vf", [
		[-size[0]/2, -size[1]/2, -size[2]/2],
		[+size[0]/2, -size[1]/2, -size[2]/2],
		[-size[0]/2, +size[1]/2, -size[2]/2],
		[+size[0]/2, +size[1]/2, -size[2]/2],
		[-size[0]/2, -size[1]/2, +size[2]/2],
		[+size[0]/2, -size[1]/2, +size[2]/2],
		[-size[0]/2, +size[1]/2, +size[2]/2],
		[+size[0]/2, +size[1]/2, +size[2]/2]
	], [
		[0,1,3,2],[0,4,5,1],[4,6,7,5],[3,7,6,2],[1,5,7,3],[6,4,0,2]
	]];

function togmod1_make_polygon(verts) =
	["polygon-vp", verts, [[for( i=[0:1:len(verts)-1] ) i%len(verts)]]];

function togmod1_rounded_rect_points(size, r, pos=[0,0], simplify_rounded_sides=false) =
	assert(is_list(size))
	assert(len(size) >= 2)
	let(radii = is_list(r) ? r : is_num(r) ? [r,r] : assert(false, "rounded_rect r(adius) should be list<num> or num"))
	let(rx = radii[0])
	let(ry = radii[1])
	assert(is_num(rx))
	assert(is_num(ry))
	assert(size[0] >= 2*rx, str("size[0] must be >= 2*r[0]; size[0] = ",size[0],", 2*r[0] = ",2*rx))
	assert(size[1] >= 2*ry, str("size[1] must be >= 2*r[1]; size[1] = ",size[1],", 2*r[1] = ",2*ry))
	let(quarterfn=max($fn/4, 1))
	let(qfnx = simplify_rounded_sides && size[0] == 2*rx ? quarterfn-1 : quarterfn)
	let(qfny = simplify_rounded_sides && size[1] == 2*ry ? quarterfn-1 : quarterfn)
	let(finalizepos = togmod1__make_nd_vector_adder(pos))
[
	for(a=[0 : 1 : qfnx]) let(ang=      a*90/quarterfn) finalizepos([ size[0]/2-rx + rx*cos(ang),  size[1]/2-ry + ry*sin(ang)]),
	for(a=[0 : 1 : qfny]) let(ang= 90 + a*90/quarterfn) finalizepos([-size[0]/2+rx + rx*cos(ang),  size[1]/2-ry + ry*sin(ang)]),
	for(a=[0 : 1 : qfnx]) let(ang=180 + a*90/quarterfn) finalizepos([-size[0]/2+rx + rx*cos(ang), -size[1]/2+ry + ry*sin(ang)]),
	for(a=[0 : 1 : qfny]) let(ang=270 + a*90/quarterfn) finalizepos([ size[0]/2-rx + rx*cos(ang), -size[1]/2+ry + ry*sin(ang)]),
];

function togmod1_make_rect(size) =
	togmod1_make_polygon([
		[-size[0]/2, -size[1]/2],
		[+size[0]/2, -size[1]/2],
		[+size[0]/2, +size[1]/2],
		[-size[0]/2, +size[1]/2],
	]);

function togmod1_make_rounded_rect(size, r) =
	r == 0 ? togmod1_make_rect(size) :
	togmod1_make_polygon(togmod1_rounded_rect_points(size,r,simplify_rounded_sides=true));

/**
 * Returns points for an approximation of a circle where points are at distance r from pos.
 * Can be used to make other regular polygons, but the faces will be less than that
 * distance from pos (do some trig if you want face distance, e.g. for a hex nut).
 */
function togmod1_circle_points(r, pos=[0,0], d=undef) =
	assert( !is_undef(r) || !is_undef(d) )
	assert(!is_undef(pos[0]))
	assert(!is_undef(pos[1]))
	let(finalizepos = togmod1__make_nd_vector_adder(pos))
	let(r_ = !is_undef(r) ? r : d/2)
	let(fn = max($fn, 3))
	[for(i=[0 : 1 : fn-1]) finalizepos([r_*cos(i*360/fn), r_*sin(i*360/fn)])];

function togmod1_make_circle(r, pos=[0,0], d=undef) =
	r == 0 || d == 0 ? ["union"] :
	togmod1_make_polygon(togmod1_circle_points(r=r, pos=pos, d=d));

function togmod1_make_cylinder(d, zrange=[0,1], r=undef, pos=[0,0]) =
	assert( !is_undef(r) || !is_undef(d) )
	let( r_ = !is_undef(r) ? r : d/2 )
	// TODO: Make polyhedron directly
	["linear-extrude-zs", zrange, togmod1_make_circle(r=r_, pos=pos)];

function togmod1__is_range1d(range) = is_list(range) && len(range) == 2 && is_num(range[0]) && is_num(range[1]);

function togmod1_linear_extrude_z(range, shape) =
	assert(togmod1__is_range1d(range))
	["linear-extrude-zs", range, shape];
function togmod1_linear_extrude_x(range, shape) =
	assert(togmod1__is_range1d(range))
	["rotate", [90, 0, 90], togmod1_linear_extrude_z(range, shape)];
function togmod1_linear_extrude_y(range, shape) =
	assert(togmod1__is_range1d(range))
	["rotate", [90, 0,  0], togmod1_linear_extrude_z([-range[1], -range[0]], shape)];

function togmod1_text(text, size, font, halign, valign, spacing, direction, language, script) =
	["text-tsfhvsdls", text, size, font, halign, valign, spacing, direction, language, script];
// file: ../lib/TOGMod1.scad
// TOGMod1.9
// OpenSCAD library for representing shapes
// 
// See also: Functional OpenSCAD (https://github.com/thehans/FunctionalOpenSCAD)
// 
// v1.8:
// - Add `text-tsfhvsdls`
// v1.9
// - Add `offset-ds` (offset with _d_elta a _s_hape)

module togmod1_domodule(mod) {
	assert(is_list(mod));
	assert(len(mod) > 0);
	if( mod[0] == "polygon-vp" ) {
		// ["polygon-vp", vertexes, paths]
		polygon(points=mod[1], paths=mod[2]);
	} else if( mod[0] == "polyhedron-vf" ) {
		polyhedron(mod[1], faces=mod[2]);
	} else if( mod[0] == "scale" ) {
		assert(len(mod) == 3);
		scale(mod[1]) togmod1_domodule(mod[2]);
	} else if( mod[0] == "translate" ) {
		assert(len(mod) == 3);
		assert(is_list(mod[1]));
		for(c=mod[1]) assert(is_num(c), "translate component should be numeric");
		translate(mod[1]) togmod1_domodule(mod[2]);
	} else if( mod[0] == "rotate" ) {
		assert(len(mod) == 3);
		rotate(mod[1]) togmod1_domodule(mod[2]);
	} else if( mod[0] == "intersection" ) {
		intersection_for( i=[1:1:len(mod)-1] ) togmod1_domodule(mod[i]);
	} else if( mod[0] == "difference" ) {
		difference() {
			togmod1_domodule(mod[1]);
			for( i=[2:1:len(mod)-1] ) togmod1_domodule(mod[i]);
		}
	} else if( mod[0] == "union" ) {
		for( i=[1:1:len(mod)-1] ) togmod1_domodule(mod[i]);
	} else if( mod[0] == "hull" ) {
		hull() for( i=[1:1:len(mod)-1] ) togmod1_domodule(mod[i]);
	} else if( mod[0] == "offset-rs" ) {
		assert(len(mod) == 3);
		assert(is_num(mod[1]));
		assert(is_list(mod[2]));
		offset(mod[1]) togmod1_domodule(mod[2]);
	} else if( mod[0] == "linear-extrude-zs" ) {
		// ["linear-extrude-zs", [z0,z1], 2d_shape] // centered
		// ["linear-extrude-zs", height, 2d_shape]
		let( zrange = is_list(mod[1]) ? mod[1] : [-mod[1]/2, mod[1]/2] ) {
			translate([0,0,zrange[0]]) linear_extrude(zrange[1]-zrange[0]) togmod1_domodule(mod[2]);
		}
	} else if( mod[0] == "render" ) {
		render() togmod1_domodule(mod[1]);
	} else if( mod[0] == "minkowski" ) {
		minkowski() {
			togmod1_domodule(mod[1]);
			togmod1_domodule(mod[2]);
		}
	} else if( mod[0] == "x-debug" ) {
		# togmod1_domodule(mod[1]);
	} else if( mod[0] == "x-color" ) {
		color(mod[1]) togmod1_domodule(mod[2]);
	} else if( mod[0] == "text-tsfhvsdls" ) {
		text(text=mod[1], size=mod[2], font=mod[3], halign=mod[4], valign=mod[5], spacing=mod[6], direction=mod[7], language=mod[7], script=mod[8]);
	} else if( mod[0] == "offset-ds" ) {
		assert(is_num(mod[1]));
		assert(is_list(mod[2]));
		offset(delta=mod[1]) togmod1_domodule(mod[2]);
	} else {
		assert(false, str("Unrecognized shape: ", mod[0]));
	}
}
// main file
// PlantLabel1.1
// 
// A thing you can write on and stick in the dirt.
// 
// Changes:
// v1.1:
// - Allow label and post to be the same width
// - Adjust rounding radii to allow for arbitrarily narrow labels/posts

thickness = "1/8inch";
label_width = "3inch";
label_height = "3inch";
post_width = "3/4inch";
post_height = "3inch";
$fn = 24;

module __plantlabel1__end_params() { }

use <../lib/TOGMod1.scad>
use <../lib/TOGMod1Constructors.scad>
use <../lib/TOGPath1.scad>
use <../lib/TOGUnits1.scad>

atom = togunits1_to_mm("1atom");

labw = togunits1_to_mm(label_width);
labh = togunits1_to_mm(label_height);
posw = togunits1_to_mm(post_width);
posh = togunits1_to_mm(post_height);
thickness_mm = togunits1_to_mm(thickness);

hole_2d = togmod1_make_circle(d = 4.5);

// TODO: Rounding will need adjustment for very small sizes
labr    = min(atom/2, labw*127/256, labh*127/256);
postipr = min(atom/2, posw*31/256);
hipr    = min(labr, abs(labw - posw)*63/256);

togmod1_domodule(["intersection",
	togmod1_linear_extrude_z([-1, thickness_mm+1], ["difference",
		togpath1_rath_to_polygon(["togpath1-rath",
			["togpath1-rathnode", [-labw/2, labh       ], ["round", labr]],
			each labw != posw ? [
				["togpath1-rathnode", [-labw/2,    0       ], ["round", hipr]],
				["togpath1-rathnode", [-posw/2,    0       ], ["round", hipr]],
			] : [],
			["togpath1-rathnode", [-posw/2,-posh+posw/2], ["round", labr]],
			["togpath1-rathnode", [-posw/4,-posh       ], ["round", postipr]],
			["togpath1-rathnode", [ posw/4,-posh       ], ["round", postipr]],
			["togpath1-rathnode", [ posw/2,-posh+posw/2], ["round", labr]],
			each labw != posw ? [
				["togpath1-rathnode", [ posw/2,    0       ], ["round", hipr]],
				["togpath1-rathnode", [ labw/2,    0       ], ["round", hipr]],
			] : [],
			["togpath1-rathnode", [ labw/2, labh       ], ["round", labr]],
		]),
		
		for( xm = [round(-labw/atom+1/4)/2 + 0.5 : 1 : round(labw/atom-1/4)/2 - 0.4] )
		for( y = labh-atom/2 ) ["translate", [xm*atom,y], hole_2d]
	]),
	
	togmod1_linear_extrude_x([-labw, +labw], togmod1_make_polygon([
		[- posh - posw * 0.5, 0],
		[ labh*2, 0],
		[ labh*2, thickness_mm],
		[-posh + posw, thickness_mm],
	])),
]);
